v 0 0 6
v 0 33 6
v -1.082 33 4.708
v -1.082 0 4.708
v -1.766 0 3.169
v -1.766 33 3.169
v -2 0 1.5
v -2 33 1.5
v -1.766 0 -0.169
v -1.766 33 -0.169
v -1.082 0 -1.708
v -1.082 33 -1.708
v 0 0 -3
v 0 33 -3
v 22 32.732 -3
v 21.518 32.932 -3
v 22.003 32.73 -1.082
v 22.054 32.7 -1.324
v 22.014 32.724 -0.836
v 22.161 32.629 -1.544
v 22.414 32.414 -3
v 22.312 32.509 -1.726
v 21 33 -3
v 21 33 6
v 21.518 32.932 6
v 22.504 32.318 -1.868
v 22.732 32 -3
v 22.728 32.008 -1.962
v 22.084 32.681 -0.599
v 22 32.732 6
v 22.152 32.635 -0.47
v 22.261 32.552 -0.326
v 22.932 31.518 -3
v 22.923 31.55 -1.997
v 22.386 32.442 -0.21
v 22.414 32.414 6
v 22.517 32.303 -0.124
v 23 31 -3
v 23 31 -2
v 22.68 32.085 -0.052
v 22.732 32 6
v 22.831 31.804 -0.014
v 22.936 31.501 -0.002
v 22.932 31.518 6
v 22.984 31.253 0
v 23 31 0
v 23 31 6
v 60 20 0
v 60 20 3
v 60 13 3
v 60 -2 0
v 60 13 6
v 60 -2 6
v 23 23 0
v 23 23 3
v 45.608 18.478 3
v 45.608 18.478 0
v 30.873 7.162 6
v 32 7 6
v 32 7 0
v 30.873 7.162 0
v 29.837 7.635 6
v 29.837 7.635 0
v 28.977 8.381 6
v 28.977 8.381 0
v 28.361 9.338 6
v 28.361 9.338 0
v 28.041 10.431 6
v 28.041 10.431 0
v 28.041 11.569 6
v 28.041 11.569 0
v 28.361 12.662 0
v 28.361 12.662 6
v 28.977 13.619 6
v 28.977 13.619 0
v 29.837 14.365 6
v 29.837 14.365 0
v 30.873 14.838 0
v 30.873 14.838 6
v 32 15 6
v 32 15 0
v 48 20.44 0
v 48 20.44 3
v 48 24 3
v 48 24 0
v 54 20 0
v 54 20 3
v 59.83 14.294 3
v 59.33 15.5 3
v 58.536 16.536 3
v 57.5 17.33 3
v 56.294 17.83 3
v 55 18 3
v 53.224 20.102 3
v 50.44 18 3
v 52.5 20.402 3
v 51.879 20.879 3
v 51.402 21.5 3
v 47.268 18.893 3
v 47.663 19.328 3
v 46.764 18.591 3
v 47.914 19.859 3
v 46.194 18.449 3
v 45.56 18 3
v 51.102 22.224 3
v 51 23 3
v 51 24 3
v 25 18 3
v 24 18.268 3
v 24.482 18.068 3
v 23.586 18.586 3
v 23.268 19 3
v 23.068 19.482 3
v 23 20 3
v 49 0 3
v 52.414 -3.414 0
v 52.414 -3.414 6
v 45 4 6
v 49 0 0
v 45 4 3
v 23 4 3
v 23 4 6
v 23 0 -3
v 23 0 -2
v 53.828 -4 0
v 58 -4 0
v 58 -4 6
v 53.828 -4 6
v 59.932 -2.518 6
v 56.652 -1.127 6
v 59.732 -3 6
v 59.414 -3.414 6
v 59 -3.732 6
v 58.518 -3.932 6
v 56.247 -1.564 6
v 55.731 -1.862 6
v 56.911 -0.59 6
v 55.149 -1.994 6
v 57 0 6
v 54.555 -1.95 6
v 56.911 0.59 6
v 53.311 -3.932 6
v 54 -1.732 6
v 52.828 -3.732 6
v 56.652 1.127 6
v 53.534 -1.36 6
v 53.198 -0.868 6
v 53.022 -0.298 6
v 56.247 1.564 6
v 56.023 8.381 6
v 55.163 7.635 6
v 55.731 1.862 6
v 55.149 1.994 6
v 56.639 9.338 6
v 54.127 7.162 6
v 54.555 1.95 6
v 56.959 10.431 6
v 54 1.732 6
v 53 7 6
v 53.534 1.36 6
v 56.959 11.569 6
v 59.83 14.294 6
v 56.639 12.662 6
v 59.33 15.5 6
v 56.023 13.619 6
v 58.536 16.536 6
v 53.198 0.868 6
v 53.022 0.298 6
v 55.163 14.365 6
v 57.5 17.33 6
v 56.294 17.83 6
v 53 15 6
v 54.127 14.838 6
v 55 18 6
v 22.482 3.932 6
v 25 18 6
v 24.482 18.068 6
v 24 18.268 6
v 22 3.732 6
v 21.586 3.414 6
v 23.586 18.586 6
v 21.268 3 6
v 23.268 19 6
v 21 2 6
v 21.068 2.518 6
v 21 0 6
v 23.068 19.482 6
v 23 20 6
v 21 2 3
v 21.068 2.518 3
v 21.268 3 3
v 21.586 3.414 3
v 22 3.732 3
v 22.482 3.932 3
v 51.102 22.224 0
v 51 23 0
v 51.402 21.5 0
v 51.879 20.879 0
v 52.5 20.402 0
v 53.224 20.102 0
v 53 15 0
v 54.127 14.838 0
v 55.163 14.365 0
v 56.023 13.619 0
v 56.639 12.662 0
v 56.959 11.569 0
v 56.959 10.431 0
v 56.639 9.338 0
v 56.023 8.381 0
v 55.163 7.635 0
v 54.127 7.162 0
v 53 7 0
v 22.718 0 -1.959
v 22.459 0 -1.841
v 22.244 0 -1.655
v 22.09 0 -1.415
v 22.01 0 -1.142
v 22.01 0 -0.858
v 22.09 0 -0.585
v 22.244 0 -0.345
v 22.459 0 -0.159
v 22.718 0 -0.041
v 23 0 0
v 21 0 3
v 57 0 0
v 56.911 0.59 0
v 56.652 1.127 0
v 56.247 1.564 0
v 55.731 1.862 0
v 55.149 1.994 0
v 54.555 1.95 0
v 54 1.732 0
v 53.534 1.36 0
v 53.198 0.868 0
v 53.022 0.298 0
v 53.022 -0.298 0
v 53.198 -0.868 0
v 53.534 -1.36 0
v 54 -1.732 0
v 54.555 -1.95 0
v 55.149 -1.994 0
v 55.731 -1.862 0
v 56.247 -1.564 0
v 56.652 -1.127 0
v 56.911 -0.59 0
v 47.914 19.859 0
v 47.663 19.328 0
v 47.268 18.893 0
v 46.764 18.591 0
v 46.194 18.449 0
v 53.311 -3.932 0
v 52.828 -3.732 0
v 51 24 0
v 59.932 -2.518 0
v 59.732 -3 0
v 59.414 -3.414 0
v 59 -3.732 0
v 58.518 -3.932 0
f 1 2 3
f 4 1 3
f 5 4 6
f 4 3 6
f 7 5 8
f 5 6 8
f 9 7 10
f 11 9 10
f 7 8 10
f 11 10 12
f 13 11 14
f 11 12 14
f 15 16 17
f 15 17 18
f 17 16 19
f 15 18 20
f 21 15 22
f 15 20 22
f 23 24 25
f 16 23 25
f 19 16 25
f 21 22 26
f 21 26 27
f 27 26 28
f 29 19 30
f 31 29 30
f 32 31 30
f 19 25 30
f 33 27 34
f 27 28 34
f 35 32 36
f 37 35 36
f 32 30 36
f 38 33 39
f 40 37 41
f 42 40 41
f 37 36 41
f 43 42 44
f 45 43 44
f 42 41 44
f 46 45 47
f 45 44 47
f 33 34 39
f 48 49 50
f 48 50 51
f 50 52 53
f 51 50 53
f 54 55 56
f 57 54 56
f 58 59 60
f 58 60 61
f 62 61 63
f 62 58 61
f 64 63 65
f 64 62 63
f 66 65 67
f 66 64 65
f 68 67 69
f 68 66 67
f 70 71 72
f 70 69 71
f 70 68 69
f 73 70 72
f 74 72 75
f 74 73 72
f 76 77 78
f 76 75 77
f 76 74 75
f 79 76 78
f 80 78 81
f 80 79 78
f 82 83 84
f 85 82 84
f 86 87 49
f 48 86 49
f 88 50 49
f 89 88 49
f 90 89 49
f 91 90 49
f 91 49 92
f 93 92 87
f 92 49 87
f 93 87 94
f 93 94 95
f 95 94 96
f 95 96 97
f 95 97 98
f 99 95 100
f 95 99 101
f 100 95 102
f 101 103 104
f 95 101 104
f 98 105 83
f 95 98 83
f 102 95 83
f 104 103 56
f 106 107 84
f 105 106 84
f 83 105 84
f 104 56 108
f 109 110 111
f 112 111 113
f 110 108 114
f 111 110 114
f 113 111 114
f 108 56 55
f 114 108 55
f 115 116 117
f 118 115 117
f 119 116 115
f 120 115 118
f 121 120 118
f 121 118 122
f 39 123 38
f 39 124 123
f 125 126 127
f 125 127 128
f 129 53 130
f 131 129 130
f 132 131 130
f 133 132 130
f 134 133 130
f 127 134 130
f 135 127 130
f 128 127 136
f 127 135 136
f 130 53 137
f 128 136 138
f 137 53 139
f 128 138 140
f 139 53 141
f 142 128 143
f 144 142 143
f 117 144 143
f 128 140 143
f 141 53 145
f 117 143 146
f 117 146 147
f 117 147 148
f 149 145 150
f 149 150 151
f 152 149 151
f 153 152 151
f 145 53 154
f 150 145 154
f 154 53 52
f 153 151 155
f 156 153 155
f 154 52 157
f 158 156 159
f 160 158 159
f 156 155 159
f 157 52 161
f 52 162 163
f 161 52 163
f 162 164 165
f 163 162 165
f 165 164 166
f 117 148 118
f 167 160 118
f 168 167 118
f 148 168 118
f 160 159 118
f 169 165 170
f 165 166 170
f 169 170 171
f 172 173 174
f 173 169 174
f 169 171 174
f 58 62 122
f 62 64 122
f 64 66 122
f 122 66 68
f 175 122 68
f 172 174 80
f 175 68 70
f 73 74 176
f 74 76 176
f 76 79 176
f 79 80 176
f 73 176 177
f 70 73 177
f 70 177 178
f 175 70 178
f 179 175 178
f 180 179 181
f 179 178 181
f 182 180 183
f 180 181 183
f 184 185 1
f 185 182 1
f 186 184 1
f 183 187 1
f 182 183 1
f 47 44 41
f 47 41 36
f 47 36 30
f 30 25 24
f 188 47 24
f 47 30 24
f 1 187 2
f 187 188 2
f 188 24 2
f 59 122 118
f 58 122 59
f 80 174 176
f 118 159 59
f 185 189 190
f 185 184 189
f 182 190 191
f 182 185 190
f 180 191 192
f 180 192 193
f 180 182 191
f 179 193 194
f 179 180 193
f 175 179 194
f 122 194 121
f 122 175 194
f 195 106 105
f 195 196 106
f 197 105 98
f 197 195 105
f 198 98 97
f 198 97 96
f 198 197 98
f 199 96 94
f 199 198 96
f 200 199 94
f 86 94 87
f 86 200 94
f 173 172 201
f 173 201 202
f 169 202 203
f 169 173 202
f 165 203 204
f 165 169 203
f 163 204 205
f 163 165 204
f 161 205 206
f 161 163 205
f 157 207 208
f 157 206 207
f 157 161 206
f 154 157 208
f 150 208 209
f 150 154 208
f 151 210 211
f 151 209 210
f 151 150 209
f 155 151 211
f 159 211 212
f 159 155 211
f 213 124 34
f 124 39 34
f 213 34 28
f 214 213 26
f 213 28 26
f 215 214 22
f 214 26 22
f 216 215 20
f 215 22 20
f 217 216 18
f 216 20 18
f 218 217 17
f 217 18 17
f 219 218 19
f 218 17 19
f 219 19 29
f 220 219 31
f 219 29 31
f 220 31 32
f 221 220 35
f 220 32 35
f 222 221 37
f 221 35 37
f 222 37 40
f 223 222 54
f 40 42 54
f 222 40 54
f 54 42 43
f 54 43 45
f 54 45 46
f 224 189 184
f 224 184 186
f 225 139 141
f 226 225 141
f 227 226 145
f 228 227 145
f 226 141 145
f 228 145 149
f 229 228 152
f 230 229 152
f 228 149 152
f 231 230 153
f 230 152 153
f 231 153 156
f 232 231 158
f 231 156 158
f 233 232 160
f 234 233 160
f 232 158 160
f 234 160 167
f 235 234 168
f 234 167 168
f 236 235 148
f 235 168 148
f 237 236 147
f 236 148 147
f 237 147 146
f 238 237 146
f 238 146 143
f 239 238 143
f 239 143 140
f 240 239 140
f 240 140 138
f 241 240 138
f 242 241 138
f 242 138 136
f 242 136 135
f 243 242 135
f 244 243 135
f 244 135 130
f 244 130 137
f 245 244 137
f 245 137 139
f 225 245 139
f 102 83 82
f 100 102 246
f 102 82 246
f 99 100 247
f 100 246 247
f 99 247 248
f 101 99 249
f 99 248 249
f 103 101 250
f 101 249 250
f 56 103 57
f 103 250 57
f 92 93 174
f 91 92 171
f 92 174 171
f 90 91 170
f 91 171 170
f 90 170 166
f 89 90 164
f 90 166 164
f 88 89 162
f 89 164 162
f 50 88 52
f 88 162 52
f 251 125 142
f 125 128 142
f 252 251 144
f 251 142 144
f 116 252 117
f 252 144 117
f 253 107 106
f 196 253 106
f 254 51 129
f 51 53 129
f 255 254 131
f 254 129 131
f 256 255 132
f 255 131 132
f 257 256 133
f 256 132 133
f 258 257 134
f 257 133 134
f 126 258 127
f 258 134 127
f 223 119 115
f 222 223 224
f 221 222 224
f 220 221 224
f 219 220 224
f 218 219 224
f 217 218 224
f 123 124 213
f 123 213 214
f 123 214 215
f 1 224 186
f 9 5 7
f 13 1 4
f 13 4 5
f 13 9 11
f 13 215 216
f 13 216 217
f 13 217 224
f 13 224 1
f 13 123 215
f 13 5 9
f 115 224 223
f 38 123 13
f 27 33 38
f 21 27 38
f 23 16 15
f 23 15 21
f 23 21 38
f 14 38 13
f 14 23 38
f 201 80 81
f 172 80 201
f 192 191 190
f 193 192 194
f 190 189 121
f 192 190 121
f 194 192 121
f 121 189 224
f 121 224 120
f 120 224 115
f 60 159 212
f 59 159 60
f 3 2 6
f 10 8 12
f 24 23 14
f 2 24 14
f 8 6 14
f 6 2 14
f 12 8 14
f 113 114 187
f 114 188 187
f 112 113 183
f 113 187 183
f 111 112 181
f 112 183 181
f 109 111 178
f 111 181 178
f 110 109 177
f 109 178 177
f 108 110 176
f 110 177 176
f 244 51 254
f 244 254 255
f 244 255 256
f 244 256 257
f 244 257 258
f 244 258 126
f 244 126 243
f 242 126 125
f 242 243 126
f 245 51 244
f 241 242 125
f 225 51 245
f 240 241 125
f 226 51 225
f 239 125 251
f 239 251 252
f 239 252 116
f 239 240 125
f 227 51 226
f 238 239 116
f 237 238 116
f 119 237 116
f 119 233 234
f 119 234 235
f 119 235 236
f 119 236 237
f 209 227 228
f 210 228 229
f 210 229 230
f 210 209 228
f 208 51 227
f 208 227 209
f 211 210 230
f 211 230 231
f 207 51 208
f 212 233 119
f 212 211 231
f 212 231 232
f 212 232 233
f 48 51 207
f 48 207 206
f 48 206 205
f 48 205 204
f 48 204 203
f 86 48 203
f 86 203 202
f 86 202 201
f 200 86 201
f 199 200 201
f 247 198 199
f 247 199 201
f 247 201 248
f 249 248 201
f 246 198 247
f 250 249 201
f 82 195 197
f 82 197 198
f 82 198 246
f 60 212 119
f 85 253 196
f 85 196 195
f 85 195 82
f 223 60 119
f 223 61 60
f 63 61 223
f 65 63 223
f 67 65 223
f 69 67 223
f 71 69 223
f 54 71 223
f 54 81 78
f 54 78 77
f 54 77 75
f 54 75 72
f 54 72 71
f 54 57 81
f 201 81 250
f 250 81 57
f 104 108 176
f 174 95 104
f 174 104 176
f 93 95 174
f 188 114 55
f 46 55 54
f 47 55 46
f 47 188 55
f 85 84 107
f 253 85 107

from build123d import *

# Parameters (mm, degrees)
EXTRUSION1_DEPTH        = 6
NERVURE1_REACH          = 70.739
ESQUISSE2_WALL_W        = 167.477270848
ESQUISSE2_WALL_H        = 3
ENL_V_MAT_EXTRU_1_DEPTH = 69.738635424
NERVURE2_REACH          = 70.739
ESQUISSE4_WALL_W        = 164.972368416
ESQUISSE4_WALL_H        = 3
CONG_1_R                = 2
CONG_3_R                = 5
NERVURE4_START          = -3
NERVURE4_DEPTH          = 3
CONG_4_R                = 3
CONG_5_R                = 2
ESQUISSE6_W             = 23
ESQUISSE6_H             = 33
EXTRUSION2_DEPTH        = 3
EXTRUSION3_DEPTH        = 33
CONG_7_R                = 2
ESQUISSE9_R             = 1
ENL_V_MAT_EXTRU_2_DEPTH = 71.746024717
ESQUISSE10_R            = 2
ENL_V_MAT_EXTRU_3_DEPTH = 70.065186747


# Read off the part's stored shape, not the designer's step: Nervure4
with BuildPart() as part:
    # Esquisse1 → Extrusion1 (new body)
    with BuildSketch(Plane.XY):
        Polygon((0, 0), (0, 33), (23, 33), (23, 18), (60, 18), (60, -4), (53, -4), (45, 4), (21, 4), (21, 0), align=None)
    extrude(amount=EXTRUSION1_DEPTH)

    # Esquisse2 wall → Nervure1 (add, up to next)
    with BuildSketch(Plane(origin=(35, 0, 0), x_dir=(1, 0, 0), z_dir=(0, -1, 0)), mode=Mode.PRIVATE) as nervure1_sk1:
        with Locations((0, 1.5)):
            Rectangle(ESQUISSE2_WALL_W, ESQUISSE2_WALL_H)
    nervure1_tool1 = extrude(nervure1_sk1.sketch, amount=-NERVURE1_REACH, mode=Mode.PRIVATE) - part.part
    add(nervure1_tool1.solids().sort_by_distance((35, 0, 0))[0])

    # Esquisse3 → Enlèv. mat.-Extru.1 (cut, through all)
    with BuildSketch(Plane.XY.offset(6)):
        with BuildLine():
            Line((32, 15), (53, 15))
            ThreePointArc((53, 15), (57, 11), (53, 7))
            Line((53, 7), (32, 7))
            ThreePointArc((32, 7), (28, 11), (32, 15))
        make_face()
    extrude(amount=-ENL_V_MAT_EXTRU_1_DEPTH, mode=Mode.SUBTRACT)

    # Esquisse4 wall → Nervure2 (add, up to next)
    with BuildSketch(Plane(origin=(35.5, 20.5, 0), x_dir=(0.980580675691, -0.196116135138, 0), z_dir=(-0.196116135138, -0.980580675691, 0)), mode=Mode.PRIVATE) as nervure2_sk1:
        with Locations((0, 1.5)):
            Rectangle(ESQUISSE4_WALL_W, ESQUISSE4_WALL_H)
    nervure2_tool1 = extrude(nervure2_sk1.sketch, amount=NERVURE2_REACH, mode=Mode.PRIVATE) - part.part
    add(nervure2_tool1.solids().sort_by_distance((35.5, 20.5, 0))[0])

    # Congé1
    cong_1_edges = [part.edges().sort_by_distance(p)[0] for p in [
        (23, 18, 4.5),
        (21, 4, 4.5),
    ]]
    fillet(cong_1_edges, radius=CONG_1_R)

    # Congé3
    cong_3_edges = [part.edges().sort_by_distance(p)[0] for p in [
        (60, 18, 3),
    ]]
    fillet(cong_3_edges, radius=CONG_3_R)

    # Nervure4 outline → Nervure4 (add)
    with BuildSketch(Plane(origin=(0, 0, 0), x_dir=(-1, 0, 0), z_dir=(0, 0, -1)).offset(NERVURE4_START)):
        with BuildLine():
            Line((-60, 20), (-60, 13))
            ThreePointArc((-60, 13), (-58.535533906, 16.535533906), (-55, 18))
            Line((-55, 18), (-48, 18))
            Line((-48, 18), (-48, 24))
            Line((-48, 24), (-51, 24))
            Line((-51, 24), (-51, 20))
            Line((-51, 20), (-60, 20))
        make_face()
    extrude(amount=NERVURE4_DEPTH)

    # Congé4
    cong_4_edges = [part.edges().sort_by_distance(p)[0] for p in [
        (51, 20, 1.5),
    ]]
    fillet(cong_4_edges, radius=CONG_4_R)

    # Congé5
    cong_5_edges = [part.edges().sort_by_distance(p)[0] for p in [
        (48, 18, 1.5),
    ]]
    fillet(cong_5_edges, radius=CONG_5_R)

    # Esquisse6 → Extrusion2 (add)
    with BuildSketch(Plane(origin=(0, 0, 0), x_dir=(-1, 0, 0), z_dir=(0, 0, -1))):
        with Locations((-11.5, 16.5)):
            Rectangle(ESQUISSE6_W, ESQUISSE6_H)
    extrude(amount=EXTRUSION2_DEPTH)

    # Esquisse8 → Extrusion3 (add)
    with BuildSketch(Plane(origin=(0, 33, 0), x_dir=(1, 0, 0), z_dir=(0, 1, 0))):
        with BuildLine():
            Line((0, 3), (0, -6))
            ThreePointArc((0, -6), (-2, -1.5), (0, 3))
        make_face()
    extrude(amount=-EXTRUSION3_DEPTH)

    # Congé7
    cong_7_edges = [part.edges().sort_by_distance(p)[0] for p in [
        (23, 33, 1.5),
        (60, -4, 3),
        (53, -4, 3),
    ]]
    fillet(cong_7_edges, radius=CONG_7_R)

    # Esquisse9 → Enlèv. mat.-Extru.2 (cut, through all)
    with BuildSketch(Plane(origin=(0, 33, 0), x_dir=(1, 0, 0), z_dir=(0, 1, 0))):
        with Locations((23, 1)):
            Circle(ESQUISSE9_R)
    extrude(amount=-ENL_V_MAT_EXTRU_2_DEPTH, mode=Mode.SUBTRACT)

    # Esquisse10 → Enlèv. mat.-Extru.3 (cut, through all)
    with BuildSketch(Plane.XY.offset(6)):
        with Locations((55, 0)):
            Circle(ESQUISSE10_R)
    extrude(amount=-ENL_V_MAT_EXTRU_3_DEPTH, mode=Mode.SUBTRACT)


solid = part.part
